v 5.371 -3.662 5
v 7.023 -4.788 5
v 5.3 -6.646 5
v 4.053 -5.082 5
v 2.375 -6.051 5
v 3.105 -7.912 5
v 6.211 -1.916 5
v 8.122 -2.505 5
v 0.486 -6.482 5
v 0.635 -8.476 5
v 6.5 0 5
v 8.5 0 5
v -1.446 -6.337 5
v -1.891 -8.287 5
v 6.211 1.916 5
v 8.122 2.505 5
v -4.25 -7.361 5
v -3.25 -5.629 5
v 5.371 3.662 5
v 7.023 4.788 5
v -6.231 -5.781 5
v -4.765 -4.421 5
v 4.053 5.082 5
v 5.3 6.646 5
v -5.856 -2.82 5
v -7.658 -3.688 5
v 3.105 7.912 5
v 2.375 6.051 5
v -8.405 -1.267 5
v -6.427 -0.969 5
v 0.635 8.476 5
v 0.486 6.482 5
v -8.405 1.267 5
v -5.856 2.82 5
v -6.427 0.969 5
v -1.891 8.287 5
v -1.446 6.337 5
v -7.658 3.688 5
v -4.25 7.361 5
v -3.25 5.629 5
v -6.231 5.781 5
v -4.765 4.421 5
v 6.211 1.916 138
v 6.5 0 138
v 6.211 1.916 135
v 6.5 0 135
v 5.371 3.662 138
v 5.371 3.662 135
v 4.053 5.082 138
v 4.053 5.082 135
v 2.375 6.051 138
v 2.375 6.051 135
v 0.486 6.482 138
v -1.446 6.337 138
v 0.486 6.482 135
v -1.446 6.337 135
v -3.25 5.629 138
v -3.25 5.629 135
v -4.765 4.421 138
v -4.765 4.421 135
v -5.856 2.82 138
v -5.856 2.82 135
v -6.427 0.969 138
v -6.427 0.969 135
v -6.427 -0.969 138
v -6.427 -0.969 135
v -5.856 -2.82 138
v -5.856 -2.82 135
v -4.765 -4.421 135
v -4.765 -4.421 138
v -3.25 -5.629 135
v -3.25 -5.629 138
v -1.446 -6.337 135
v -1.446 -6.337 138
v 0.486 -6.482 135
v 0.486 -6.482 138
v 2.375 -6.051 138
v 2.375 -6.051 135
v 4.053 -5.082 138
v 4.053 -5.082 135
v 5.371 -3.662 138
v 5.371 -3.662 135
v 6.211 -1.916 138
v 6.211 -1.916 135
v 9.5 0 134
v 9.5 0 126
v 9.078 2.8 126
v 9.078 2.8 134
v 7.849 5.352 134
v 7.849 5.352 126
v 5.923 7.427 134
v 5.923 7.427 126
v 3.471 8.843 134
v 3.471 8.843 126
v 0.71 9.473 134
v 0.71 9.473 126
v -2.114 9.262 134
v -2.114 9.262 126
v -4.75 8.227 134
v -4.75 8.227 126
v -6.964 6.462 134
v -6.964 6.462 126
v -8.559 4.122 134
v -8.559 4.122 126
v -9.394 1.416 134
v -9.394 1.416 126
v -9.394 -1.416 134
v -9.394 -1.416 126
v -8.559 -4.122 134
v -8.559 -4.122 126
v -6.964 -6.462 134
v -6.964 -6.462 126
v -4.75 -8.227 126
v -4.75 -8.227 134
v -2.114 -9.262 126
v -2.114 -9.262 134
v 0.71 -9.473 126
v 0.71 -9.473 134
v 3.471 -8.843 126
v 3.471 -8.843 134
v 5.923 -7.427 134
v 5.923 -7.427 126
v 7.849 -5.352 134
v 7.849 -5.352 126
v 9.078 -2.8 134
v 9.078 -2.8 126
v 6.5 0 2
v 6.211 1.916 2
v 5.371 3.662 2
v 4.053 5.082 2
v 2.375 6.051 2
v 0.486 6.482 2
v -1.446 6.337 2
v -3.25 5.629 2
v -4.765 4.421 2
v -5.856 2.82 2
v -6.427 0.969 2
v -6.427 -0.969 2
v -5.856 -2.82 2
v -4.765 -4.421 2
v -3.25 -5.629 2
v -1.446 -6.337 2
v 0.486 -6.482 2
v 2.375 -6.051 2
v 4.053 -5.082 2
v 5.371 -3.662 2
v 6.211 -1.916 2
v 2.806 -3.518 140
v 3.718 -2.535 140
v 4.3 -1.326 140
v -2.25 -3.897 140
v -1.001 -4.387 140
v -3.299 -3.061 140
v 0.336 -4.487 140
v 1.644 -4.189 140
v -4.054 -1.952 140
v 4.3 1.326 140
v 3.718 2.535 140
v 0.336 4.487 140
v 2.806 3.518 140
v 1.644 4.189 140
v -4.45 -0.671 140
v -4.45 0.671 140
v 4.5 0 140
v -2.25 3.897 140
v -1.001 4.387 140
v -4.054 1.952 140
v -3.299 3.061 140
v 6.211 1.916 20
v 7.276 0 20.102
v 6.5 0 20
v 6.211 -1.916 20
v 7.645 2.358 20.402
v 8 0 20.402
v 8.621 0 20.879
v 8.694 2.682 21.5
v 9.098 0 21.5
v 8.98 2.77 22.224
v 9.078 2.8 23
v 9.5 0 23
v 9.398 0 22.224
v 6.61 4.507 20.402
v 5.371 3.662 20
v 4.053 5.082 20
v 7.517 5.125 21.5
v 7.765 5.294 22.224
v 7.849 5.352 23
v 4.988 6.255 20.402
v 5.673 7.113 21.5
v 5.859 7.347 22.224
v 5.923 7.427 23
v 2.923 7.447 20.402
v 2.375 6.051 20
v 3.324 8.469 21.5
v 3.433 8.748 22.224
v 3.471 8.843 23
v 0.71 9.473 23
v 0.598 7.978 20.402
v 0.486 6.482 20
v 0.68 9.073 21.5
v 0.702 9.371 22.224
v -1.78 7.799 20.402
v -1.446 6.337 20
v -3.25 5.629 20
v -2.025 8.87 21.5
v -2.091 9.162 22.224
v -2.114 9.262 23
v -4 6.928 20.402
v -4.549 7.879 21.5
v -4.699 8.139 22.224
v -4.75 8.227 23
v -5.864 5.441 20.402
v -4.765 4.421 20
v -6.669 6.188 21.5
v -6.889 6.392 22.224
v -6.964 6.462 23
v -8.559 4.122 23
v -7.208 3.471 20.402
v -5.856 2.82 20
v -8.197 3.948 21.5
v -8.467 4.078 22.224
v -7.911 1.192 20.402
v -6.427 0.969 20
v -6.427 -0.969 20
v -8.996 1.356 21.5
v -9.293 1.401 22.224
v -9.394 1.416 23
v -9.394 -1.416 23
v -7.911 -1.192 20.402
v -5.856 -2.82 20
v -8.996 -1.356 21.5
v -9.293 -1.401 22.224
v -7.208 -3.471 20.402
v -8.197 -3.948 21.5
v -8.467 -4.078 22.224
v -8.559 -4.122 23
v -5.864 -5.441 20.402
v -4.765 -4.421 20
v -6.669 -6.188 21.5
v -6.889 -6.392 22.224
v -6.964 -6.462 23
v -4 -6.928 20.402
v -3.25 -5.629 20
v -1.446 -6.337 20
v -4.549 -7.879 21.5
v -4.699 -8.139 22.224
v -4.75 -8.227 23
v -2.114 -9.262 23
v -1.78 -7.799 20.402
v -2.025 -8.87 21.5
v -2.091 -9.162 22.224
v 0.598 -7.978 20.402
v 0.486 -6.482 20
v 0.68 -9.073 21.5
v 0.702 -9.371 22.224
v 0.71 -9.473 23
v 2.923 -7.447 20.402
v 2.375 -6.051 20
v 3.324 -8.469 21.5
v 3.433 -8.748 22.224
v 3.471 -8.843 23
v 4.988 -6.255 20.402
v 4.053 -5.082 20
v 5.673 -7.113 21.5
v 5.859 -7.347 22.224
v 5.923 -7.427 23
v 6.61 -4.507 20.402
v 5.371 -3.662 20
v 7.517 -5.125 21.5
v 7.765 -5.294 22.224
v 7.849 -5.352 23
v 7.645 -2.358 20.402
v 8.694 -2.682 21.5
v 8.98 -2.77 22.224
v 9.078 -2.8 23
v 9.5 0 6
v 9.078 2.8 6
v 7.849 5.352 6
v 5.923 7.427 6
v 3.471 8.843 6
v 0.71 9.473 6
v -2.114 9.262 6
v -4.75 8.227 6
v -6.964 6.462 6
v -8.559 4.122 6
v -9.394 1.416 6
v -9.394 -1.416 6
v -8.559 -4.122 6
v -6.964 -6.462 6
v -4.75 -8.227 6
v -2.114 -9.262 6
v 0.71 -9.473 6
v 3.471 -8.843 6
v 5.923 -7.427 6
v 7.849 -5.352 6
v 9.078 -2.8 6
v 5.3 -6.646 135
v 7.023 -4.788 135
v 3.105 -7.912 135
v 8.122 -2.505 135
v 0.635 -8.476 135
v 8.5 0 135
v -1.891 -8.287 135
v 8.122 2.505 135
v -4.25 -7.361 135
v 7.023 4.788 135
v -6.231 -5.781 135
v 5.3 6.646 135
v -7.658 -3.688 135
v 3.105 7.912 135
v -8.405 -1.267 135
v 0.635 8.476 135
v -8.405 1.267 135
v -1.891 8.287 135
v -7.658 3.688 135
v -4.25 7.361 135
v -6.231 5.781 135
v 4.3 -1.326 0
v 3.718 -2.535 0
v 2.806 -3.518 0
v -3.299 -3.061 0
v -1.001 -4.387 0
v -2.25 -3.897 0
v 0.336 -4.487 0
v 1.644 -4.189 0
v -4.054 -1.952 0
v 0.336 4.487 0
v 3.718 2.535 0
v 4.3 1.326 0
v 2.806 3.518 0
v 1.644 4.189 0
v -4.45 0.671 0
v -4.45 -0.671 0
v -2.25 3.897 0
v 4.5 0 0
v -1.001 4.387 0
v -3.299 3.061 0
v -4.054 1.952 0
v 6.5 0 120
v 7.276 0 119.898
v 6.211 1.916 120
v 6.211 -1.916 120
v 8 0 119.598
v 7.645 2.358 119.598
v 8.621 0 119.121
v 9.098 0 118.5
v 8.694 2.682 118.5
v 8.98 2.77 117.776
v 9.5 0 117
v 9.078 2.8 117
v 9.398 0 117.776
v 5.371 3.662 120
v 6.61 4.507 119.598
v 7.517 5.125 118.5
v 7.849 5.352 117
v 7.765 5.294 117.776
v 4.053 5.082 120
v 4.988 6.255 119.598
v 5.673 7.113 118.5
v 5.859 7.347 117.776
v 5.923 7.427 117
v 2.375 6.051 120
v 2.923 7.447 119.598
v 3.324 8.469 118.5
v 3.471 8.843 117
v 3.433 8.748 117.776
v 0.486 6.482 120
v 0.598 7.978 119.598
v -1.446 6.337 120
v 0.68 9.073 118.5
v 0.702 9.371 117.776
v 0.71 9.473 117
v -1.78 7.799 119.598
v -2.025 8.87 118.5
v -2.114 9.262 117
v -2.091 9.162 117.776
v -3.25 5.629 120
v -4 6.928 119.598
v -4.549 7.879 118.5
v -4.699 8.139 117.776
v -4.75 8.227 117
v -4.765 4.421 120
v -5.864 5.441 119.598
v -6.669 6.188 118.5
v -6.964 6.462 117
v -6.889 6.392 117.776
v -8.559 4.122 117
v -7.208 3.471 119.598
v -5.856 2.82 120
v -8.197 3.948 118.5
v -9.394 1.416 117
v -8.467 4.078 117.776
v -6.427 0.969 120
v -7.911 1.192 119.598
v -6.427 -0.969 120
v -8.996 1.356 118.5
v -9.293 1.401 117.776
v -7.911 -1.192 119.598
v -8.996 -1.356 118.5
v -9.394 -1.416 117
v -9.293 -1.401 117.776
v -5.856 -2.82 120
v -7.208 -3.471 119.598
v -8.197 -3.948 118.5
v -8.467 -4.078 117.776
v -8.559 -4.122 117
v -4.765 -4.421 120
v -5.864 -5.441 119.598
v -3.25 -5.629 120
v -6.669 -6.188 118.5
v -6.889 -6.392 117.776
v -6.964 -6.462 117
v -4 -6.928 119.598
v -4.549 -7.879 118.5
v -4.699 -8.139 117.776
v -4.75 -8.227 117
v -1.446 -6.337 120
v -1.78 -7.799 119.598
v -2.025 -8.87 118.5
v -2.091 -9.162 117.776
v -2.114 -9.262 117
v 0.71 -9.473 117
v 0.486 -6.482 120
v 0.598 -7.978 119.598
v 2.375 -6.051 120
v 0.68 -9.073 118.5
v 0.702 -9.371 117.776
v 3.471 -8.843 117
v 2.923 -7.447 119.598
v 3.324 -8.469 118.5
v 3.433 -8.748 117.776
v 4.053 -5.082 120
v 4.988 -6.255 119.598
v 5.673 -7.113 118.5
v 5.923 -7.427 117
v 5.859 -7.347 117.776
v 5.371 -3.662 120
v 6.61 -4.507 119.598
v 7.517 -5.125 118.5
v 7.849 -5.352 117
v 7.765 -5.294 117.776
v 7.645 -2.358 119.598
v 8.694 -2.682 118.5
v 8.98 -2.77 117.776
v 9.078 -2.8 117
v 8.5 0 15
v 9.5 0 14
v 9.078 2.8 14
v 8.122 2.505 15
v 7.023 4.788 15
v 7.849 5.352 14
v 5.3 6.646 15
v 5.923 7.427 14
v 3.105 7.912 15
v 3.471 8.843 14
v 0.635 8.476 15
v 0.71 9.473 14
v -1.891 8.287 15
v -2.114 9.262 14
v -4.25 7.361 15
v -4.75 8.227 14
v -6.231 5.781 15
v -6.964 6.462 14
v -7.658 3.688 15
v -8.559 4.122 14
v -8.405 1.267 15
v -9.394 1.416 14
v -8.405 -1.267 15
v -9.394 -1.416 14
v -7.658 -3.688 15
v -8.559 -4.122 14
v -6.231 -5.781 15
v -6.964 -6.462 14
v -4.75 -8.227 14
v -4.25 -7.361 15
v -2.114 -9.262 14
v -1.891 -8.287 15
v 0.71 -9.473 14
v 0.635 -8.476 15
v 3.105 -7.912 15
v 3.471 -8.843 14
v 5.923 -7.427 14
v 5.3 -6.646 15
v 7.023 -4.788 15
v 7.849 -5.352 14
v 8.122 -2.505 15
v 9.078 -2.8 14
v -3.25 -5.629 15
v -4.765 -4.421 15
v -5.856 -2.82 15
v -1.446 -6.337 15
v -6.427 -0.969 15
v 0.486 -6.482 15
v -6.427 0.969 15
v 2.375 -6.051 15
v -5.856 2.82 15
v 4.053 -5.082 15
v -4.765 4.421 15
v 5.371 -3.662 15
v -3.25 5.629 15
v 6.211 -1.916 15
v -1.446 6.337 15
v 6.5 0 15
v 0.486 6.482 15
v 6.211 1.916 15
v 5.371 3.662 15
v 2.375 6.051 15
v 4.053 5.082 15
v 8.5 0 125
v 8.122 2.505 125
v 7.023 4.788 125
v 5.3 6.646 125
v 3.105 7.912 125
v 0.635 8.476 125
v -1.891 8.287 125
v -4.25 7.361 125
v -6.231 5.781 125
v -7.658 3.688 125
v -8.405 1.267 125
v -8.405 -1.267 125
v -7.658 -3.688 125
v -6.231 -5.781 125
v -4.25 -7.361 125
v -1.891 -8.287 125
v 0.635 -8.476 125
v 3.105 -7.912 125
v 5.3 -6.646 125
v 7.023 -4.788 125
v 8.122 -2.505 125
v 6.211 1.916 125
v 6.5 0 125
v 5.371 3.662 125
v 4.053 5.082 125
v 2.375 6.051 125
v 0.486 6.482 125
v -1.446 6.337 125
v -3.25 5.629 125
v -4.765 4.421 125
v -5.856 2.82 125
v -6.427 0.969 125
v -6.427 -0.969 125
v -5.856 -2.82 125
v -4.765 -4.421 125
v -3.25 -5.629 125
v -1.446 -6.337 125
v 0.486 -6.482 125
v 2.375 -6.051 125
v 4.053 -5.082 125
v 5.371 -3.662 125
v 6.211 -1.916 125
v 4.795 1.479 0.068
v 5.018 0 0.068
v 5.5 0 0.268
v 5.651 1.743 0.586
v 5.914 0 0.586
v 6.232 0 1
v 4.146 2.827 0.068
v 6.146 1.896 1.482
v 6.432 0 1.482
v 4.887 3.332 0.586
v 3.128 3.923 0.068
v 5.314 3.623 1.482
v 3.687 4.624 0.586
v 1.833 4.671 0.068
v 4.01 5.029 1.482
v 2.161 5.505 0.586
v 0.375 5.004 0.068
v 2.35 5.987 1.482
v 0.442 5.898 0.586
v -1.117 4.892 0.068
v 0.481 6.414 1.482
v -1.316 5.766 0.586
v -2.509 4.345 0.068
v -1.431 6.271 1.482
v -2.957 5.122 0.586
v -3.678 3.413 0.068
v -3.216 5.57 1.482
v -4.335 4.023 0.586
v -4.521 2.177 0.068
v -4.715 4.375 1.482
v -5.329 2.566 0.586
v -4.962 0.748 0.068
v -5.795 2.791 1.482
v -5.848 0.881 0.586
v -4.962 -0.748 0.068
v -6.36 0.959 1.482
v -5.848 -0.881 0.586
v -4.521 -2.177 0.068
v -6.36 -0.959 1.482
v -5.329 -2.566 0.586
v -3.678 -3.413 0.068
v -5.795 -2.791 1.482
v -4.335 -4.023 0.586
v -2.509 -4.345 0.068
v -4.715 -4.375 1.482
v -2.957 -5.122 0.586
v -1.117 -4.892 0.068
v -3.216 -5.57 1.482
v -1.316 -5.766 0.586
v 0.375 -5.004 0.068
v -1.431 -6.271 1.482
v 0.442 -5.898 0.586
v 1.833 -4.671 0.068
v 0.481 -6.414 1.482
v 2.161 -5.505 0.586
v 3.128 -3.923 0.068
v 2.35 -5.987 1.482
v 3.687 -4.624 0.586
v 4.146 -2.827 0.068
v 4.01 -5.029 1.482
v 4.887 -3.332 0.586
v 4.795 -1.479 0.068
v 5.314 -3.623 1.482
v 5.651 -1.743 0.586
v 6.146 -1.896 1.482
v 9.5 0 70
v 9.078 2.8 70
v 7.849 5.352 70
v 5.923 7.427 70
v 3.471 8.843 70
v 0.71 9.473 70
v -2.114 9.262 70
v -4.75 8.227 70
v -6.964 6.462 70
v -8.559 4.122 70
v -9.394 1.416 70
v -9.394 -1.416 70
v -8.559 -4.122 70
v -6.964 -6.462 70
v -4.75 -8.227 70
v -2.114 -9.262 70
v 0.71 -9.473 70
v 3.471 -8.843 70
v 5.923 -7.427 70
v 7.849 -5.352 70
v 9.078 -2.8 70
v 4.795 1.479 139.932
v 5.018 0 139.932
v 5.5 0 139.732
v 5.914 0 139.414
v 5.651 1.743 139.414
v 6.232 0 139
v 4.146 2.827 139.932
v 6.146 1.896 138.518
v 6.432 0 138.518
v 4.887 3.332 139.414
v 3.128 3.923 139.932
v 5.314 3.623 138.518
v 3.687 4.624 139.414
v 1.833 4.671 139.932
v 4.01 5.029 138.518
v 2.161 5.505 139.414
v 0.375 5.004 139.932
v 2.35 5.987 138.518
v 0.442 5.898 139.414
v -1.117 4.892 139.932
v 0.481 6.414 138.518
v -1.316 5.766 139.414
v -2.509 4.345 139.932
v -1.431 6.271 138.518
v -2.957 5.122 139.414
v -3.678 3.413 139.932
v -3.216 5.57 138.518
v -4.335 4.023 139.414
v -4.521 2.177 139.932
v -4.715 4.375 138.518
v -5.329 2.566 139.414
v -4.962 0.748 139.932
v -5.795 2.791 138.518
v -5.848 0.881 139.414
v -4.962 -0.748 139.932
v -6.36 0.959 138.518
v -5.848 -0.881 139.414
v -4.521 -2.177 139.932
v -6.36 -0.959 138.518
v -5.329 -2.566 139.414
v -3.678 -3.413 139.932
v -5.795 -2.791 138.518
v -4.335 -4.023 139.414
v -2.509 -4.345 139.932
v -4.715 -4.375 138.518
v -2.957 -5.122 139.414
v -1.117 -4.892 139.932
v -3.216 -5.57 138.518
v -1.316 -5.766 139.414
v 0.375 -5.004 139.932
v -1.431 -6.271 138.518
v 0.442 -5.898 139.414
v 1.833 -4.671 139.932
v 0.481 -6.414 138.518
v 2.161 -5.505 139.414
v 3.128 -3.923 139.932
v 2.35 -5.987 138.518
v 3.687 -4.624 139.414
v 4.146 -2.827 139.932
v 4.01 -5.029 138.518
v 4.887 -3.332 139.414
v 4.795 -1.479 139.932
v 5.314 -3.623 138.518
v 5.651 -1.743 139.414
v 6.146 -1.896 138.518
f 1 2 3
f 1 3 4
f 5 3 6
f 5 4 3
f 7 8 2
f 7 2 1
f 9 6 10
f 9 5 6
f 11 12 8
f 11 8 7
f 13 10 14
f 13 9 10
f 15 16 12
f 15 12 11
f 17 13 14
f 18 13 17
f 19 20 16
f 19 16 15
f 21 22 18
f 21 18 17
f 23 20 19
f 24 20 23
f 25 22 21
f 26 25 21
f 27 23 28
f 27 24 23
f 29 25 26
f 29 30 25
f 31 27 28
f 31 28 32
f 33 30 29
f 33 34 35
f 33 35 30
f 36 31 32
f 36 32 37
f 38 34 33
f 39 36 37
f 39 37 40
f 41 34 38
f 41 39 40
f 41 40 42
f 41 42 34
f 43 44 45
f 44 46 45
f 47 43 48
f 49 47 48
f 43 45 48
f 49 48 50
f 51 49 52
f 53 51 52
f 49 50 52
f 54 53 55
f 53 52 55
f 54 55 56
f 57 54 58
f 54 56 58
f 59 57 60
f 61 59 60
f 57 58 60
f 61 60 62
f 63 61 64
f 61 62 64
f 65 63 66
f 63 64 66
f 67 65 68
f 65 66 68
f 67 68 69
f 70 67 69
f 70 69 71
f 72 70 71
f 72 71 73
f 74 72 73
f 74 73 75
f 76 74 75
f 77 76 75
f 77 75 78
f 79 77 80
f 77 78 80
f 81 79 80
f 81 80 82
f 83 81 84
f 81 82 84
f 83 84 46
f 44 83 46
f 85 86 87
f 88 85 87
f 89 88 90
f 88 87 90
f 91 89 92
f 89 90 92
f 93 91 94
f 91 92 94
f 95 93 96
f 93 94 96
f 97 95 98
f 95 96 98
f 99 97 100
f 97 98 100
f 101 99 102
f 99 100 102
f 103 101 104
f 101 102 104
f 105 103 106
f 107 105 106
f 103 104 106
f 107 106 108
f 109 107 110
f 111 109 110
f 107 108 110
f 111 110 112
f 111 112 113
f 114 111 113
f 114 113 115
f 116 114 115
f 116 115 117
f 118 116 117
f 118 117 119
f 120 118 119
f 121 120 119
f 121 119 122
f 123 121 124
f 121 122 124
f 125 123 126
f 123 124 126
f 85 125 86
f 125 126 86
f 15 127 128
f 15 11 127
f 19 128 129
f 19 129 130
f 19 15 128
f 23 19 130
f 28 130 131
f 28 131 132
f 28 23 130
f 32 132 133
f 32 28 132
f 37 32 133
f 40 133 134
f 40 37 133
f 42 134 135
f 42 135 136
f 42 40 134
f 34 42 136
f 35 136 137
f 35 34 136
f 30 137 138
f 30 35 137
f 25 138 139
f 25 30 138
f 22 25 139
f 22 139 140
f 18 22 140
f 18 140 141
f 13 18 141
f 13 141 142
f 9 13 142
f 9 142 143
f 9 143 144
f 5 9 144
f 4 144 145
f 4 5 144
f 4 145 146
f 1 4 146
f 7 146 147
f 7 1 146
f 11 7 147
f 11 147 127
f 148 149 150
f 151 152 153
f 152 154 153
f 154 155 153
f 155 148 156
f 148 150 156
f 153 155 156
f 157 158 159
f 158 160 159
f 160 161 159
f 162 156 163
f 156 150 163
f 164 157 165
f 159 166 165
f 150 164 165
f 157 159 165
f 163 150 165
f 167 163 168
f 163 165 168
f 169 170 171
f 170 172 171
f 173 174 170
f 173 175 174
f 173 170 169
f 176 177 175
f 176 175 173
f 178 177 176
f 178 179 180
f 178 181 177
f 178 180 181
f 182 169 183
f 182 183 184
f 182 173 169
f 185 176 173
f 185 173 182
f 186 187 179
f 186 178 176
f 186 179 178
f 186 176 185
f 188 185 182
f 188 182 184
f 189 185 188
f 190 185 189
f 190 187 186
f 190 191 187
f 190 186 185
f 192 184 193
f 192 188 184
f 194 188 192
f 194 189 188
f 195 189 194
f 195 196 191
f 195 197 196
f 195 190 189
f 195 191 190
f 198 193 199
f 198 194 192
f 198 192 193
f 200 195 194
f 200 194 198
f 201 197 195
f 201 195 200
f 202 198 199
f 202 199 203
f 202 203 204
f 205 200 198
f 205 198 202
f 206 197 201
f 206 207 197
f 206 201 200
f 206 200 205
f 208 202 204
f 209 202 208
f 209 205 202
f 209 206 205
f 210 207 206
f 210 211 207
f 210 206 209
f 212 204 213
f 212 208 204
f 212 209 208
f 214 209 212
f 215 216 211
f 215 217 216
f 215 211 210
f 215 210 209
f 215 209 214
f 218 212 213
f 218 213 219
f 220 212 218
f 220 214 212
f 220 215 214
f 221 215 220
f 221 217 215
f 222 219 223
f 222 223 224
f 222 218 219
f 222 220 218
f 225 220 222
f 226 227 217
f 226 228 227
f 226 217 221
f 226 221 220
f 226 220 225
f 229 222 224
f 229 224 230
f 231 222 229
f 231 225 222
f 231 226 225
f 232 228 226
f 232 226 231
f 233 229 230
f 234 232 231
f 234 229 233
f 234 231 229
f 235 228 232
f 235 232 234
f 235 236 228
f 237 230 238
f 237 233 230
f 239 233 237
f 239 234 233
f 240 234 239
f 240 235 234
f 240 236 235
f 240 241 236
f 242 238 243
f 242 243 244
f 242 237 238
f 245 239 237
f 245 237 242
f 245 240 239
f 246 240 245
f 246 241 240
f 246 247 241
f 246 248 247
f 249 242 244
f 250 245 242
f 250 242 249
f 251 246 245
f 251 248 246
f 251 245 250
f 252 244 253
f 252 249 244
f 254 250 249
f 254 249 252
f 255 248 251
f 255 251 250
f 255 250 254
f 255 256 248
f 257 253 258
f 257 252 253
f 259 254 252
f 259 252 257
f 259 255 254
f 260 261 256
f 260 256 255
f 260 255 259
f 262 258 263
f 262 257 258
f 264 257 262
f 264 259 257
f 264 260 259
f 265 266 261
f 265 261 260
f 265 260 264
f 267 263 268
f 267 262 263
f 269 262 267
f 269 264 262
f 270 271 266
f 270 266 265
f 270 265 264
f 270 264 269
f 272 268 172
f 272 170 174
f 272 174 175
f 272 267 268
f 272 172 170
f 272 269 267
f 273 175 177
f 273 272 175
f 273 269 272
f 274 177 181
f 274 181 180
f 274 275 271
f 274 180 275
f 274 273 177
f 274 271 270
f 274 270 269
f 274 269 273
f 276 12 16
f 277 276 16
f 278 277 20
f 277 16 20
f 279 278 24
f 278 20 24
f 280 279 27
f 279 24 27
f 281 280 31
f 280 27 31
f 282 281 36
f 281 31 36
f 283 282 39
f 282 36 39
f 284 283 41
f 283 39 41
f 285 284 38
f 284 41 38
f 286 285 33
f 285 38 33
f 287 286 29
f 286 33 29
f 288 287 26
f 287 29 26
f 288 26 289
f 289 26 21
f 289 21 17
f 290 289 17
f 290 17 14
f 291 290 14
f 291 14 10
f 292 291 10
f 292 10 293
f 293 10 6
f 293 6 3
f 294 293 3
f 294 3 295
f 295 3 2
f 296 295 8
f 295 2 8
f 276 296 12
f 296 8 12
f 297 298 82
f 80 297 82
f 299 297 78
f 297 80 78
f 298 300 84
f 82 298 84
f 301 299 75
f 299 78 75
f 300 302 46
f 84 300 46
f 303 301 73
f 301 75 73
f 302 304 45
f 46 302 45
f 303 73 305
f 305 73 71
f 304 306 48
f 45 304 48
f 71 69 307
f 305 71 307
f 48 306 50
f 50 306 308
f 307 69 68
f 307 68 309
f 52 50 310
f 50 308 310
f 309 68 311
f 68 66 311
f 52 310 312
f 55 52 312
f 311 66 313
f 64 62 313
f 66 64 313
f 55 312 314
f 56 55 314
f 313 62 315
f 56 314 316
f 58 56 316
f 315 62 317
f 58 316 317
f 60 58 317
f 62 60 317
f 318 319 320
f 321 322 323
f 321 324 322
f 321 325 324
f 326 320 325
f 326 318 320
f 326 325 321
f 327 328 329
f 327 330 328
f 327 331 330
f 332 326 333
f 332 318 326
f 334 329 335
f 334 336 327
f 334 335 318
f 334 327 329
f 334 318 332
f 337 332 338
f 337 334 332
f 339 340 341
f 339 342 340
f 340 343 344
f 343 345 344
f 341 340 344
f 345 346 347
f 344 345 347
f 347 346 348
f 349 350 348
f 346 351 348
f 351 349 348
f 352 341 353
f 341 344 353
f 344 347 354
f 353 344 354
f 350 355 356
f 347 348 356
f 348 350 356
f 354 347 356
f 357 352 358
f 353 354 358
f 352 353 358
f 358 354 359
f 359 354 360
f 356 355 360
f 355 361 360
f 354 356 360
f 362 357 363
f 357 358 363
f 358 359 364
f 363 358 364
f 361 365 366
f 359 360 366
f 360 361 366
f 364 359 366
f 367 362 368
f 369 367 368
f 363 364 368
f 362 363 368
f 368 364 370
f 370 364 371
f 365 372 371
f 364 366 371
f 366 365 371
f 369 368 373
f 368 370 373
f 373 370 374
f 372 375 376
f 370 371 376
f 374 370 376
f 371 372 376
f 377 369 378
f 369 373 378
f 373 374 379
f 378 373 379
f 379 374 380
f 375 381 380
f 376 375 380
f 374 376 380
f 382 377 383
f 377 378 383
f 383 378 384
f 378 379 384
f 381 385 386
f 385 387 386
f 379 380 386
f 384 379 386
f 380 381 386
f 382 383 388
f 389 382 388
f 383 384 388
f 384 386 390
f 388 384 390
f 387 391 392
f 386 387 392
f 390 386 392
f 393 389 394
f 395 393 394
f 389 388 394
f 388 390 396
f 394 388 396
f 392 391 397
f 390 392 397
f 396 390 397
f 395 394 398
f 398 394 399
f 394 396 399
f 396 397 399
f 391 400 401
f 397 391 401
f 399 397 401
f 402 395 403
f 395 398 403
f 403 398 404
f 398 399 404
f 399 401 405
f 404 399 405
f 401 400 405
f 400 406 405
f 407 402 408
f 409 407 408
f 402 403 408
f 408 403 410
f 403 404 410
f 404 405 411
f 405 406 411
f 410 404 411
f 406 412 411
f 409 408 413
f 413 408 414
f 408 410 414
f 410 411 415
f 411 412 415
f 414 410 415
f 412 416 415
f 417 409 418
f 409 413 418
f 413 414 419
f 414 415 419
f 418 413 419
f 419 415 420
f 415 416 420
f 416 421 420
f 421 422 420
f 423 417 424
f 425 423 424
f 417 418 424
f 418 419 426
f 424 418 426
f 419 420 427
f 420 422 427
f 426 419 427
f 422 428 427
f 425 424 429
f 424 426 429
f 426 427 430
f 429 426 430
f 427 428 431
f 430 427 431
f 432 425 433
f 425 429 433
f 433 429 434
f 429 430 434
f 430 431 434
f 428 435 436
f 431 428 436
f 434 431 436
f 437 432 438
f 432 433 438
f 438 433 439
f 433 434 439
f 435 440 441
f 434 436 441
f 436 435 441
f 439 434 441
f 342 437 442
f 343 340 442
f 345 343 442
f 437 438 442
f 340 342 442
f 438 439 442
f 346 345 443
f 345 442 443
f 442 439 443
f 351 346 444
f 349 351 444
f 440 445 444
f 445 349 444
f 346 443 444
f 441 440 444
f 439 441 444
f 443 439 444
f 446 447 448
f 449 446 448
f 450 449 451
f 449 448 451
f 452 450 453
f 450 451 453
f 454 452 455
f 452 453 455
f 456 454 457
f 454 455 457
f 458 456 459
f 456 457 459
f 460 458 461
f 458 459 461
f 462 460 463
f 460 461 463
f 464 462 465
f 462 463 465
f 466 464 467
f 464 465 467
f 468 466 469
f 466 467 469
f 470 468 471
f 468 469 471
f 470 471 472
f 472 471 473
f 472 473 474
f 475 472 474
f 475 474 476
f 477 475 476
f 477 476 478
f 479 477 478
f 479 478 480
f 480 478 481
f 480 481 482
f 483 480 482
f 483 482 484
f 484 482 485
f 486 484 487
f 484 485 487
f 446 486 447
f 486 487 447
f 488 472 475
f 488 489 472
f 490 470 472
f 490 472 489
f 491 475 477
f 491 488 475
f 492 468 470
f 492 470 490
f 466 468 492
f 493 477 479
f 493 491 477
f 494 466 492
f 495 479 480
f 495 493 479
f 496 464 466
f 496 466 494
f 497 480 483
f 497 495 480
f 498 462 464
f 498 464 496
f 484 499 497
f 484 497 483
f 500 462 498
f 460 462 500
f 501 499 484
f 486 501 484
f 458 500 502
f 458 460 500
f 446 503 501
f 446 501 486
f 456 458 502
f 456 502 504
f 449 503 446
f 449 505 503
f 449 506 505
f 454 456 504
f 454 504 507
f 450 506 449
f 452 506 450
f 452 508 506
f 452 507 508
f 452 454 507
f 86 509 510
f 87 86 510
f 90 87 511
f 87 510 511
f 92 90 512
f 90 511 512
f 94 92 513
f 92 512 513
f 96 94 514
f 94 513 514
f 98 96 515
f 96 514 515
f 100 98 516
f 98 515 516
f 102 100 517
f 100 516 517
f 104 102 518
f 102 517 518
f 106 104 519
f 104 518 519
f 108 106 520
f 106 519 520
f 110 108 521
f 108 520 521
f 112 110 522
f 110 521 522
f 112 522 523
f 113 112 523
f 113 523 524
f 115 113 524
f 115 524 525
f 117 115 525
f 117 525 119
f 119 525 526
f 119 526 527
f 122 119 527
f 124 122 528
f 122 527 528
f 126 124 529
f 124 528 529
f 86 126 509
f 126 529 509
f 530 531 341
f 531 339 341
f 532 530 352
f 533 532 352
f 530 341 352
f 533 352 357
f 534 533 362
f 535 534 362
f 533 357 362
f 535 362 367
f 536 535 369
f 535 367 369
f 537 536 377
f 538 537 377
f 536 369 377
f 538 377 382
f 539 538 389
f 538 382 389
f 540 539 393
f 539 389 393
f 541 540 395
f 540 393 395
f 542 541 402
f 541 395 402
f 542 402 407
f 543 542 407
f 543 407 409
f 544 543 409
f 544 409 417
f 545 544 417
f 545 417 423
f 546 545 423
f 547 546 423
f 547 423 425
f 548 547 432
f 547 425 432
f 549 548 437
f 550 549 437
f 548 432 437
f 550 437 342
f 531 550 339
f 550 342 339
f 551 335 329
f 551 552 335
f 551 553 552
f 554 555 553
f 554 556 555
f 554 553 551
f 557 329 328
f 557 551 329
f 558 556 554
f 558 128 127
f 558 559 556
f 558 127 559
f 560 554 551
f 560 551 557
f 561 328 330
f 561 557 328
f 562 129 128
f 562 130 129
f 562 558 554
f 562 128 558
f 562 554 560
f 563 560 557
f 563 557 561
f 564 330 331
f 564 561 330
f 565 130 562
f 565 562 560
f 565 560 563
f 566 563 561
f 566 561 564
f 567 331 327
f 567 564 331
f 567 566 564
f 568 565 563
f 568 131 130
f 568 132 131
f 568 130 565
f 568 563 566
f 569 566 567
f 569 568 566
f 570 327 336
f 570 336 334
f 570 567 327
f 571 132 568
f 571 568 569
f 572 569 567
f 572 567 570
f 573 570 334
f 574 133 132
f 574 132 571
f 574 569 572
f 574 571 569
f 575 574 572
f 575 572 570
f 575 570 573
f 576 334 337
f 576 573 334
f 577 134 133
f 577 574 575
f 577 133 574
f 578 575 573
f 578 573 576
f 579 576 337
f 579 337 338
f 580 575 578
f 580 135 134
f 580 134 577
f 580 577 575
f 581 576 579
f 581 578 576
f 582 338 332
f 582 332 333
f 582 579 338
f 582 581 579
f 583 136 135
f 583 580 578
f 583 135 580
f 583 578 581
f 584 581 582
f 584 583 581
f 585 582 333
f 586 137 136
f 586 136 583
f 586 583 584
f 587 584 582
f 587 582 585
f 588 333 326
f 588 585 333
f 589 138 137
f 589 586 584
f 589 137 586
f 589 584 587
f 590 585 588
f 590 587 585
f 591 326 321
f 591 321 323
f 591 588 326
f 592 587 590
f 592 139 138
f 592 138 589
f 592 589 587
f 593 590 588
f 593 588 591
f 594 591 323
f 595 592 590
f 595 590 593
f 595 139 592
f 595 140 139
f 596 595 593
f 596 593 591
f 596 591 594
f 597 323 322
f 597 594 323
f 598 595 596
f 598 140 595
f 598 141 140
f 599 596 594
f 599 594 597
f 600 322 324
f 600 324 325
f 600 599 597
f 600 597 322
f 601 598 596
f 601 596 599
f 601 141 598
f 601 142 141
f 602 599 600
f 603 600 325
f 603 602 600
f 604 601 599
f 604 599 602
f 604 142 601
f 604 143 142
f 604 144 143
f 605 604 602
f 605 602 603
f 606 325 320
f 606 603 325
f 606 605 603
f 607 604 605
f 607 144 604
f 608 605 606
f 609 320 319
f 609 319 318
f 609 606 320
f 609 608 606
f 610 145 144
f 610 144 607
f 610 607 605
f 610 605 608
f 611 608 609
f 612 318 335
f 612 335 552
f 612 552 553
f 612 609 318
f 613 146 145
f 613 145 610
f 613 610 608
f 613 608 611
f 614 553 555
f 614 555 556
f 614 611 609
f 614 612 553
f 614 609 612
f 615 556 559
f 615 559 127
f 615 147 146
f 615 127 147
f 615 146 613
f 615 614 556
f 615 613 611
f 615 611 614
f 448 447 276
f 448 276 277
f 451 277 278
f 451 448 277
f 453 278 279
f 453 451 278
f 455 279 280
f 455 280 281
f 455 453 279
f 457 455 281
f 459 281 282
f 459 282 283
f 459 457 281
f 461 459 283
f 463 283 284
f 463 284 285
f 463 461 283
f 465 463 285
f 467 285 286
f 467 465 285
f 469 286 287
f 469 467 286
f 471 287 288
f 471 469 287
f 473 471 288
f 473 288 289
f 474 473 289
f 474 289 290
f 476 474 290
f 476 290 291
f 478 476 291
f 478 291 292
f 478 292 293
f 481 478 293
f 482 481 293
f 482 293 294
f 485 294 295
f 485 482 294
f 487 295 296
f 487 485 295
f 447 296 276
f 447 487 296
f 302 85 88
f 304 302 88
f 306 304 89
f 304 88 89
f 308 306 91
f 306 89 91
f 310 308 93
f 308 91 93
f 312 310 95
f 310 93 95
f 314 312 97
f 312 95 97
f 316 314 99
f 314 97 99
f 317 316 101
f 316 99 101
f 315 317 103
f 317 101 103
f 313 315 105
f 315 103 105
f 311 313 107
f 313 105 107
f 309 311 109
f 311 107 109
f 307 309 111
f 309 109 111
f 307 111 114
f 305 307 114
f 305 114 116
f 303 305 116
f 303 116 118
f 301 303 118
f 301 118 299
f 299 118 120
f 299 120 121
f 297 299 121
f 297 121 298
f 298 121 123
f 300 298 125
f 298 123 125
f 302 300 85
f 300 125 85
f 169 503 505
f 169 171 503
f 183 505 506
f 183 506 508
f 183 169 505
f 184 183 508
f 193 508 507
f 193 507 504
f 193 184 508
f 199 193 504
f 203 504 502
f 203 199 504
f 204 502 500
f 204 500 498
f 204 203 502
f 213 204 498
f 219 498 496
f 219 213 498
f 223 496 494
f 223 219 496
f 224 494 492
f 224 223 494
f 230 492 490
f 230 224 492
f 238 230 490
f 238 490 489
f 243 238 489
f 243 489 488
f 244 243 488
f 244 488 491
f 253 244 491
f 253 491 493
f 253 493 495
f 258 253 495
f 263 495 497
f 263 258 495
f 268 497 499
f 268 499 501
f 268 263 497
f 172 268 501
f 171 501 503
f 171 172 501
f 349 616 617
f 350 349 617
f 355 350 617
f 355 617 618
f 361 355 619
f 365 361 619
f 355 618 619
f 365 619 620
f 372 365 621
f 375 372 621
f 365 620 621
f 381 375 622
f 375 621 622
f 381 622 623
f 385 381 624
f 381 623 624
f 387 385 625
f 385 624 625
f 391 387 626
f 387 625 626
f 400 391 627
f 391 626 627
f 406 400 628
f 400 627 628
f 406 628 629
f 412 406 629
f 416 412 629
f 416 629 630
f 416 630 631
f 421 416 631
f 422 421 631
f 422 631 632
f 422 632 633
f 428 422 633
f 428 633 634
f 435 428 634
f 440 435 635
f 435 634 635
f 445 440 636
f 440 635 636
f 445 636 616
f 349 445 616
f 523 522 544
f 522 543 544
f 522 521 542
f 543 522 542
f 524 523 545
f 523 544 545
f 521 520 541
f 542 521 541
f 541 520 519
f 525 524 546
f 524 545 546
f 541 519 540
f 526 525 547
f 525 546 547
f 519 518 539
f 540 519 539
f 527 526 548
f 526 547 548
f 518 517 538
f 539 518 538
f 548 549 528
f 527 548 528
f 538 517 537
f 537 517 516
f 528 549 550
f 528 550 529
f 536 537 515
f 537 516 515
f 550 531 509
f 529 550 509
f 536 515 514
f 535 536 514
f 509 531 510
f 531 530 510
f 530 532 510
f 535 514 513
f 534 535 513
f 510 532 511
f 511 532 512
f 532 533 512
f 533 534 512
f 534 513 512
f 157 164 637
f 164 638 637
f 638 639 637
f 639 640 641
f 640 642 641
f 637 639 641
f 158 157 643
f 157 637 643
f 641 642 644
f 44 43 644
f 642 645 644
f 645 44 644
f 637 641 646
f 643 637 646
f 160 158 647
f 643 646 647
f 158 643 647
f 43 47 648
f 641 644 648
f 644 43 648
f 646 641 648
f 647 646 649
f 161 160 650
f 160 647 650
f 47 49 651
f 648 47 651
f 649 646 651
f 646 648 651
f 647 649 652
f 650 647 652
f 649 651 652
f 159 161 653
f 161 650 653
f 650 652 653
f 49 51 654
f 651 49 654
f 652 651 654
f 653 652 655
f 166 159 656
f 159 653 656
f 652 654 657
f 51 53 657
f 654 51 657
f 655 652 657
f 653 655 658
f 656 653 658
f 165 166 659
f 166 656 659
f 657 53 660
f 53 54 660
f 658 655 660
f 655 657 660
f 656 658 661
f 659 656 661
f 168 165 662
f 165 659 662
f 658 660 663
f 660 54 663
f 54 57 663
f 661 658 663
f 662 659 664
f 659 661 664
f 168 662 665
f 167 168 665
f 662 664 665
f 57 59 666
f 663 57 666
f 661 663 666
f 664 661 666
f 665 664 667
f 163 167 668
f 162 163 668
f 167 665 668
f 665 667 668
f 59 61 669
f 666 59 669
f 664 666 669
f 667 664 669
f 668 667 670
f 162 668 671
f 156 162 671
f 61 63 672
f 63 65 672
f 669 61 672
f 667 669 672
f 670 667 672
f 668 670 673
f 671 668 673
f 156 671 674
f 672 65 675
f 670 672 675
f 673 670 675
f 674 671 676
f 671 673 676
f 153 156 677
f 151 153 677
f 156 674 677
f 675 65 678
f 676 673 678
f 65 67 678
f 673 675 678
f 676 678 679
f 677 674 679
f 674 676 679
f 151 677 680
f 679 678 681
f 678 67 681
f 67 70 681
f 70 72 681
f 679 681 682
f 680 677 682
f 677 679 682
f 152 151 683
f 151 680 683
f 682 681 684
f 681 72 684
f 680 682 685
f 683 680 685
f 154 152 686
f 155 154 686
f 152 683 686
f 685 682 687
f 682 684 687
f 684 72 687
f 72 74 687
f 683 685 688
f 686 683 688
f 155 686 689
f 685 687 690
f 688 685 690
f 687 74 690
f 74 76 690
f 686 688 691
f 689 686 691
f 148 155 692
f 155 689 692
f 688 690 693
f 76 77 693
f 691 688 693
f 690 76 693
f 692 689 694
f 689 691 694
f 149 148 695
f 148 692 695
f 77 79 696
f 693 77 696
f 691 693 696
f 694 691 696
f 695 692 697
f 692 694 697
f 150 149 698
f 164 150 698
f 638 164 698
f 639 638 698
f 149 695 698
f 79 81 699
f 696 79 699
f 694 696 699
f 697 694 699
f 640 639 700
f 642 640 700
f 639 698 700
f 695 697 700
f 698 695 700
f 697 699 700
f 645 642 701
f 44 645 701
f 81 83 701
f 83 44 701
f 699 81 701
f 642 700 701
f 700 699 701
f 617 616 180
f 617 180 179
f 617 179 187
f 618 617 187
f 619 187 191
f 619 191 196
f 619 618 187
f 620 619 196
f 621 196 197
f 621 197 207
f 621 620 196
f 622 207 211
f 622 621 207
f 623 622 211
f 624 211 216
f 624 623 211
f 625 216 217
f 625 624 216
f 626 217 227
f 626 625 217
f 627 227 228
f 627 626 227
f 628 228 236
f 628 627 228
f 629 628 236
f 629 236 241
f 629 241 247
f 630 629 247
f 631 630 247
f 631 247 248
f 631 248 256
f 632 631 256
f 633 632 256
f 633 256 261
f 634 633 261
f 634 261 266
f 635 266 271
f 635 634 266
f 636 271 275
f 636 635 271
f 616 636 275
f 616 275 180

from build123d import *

# Parameters (mm, degrees)
F4_SIZE = 1


with BuildPart() as f1:
    # F0 (on Front) → F1 (revolve)
    with BuildSketch(Plane.XZ):
        with BuildLine():
            Line((0, 70), (0, 0))
            Line((0, 0), (4.5, 0))
            ThreePointArc((4.5, 0), (5.9142135624, 0.5857864376), (6.5, 2))
            Line((6.5, 2), (6.5, 5))
            Line((6.5, 5), (9.5, 5))
            Line((9.5, 5), (9.5, 15))
            Line((9.5, 15), (6.5, 15))
            Line((6.5, 15), (6.5, 20))
            ThreePointArc((6.5, 20), (8.6213203436, 20.8786796564), (9.5, 23))
            Line((9.5, 23), (9.5, 70))
            Line((9.5, 70), (0, 70))
        make_face()
    revolve(axis=Axis((0, 0, 35), (0, 0, 1)))

    # F3: F1 across plane


with BuildPart() as f1_1:
    add(f1.part)
    add(f1.part.mirror(Plane.XY.offset(70)))

    # F4
    f4_edges = [f1_1.edges().sort_by_distance(p)[0] for p in [
        (-9.5, 0, 135),
        (-9.5, 0, 125),
        (9.5, 0, 130),
        (-9.5, 0, 5),
        (-9.5, 0, 15),
        (9.5, 0, 10),
    ]]
    chamfer(f4_edges, length=F4_SIZE)


solid = f1_1.part
